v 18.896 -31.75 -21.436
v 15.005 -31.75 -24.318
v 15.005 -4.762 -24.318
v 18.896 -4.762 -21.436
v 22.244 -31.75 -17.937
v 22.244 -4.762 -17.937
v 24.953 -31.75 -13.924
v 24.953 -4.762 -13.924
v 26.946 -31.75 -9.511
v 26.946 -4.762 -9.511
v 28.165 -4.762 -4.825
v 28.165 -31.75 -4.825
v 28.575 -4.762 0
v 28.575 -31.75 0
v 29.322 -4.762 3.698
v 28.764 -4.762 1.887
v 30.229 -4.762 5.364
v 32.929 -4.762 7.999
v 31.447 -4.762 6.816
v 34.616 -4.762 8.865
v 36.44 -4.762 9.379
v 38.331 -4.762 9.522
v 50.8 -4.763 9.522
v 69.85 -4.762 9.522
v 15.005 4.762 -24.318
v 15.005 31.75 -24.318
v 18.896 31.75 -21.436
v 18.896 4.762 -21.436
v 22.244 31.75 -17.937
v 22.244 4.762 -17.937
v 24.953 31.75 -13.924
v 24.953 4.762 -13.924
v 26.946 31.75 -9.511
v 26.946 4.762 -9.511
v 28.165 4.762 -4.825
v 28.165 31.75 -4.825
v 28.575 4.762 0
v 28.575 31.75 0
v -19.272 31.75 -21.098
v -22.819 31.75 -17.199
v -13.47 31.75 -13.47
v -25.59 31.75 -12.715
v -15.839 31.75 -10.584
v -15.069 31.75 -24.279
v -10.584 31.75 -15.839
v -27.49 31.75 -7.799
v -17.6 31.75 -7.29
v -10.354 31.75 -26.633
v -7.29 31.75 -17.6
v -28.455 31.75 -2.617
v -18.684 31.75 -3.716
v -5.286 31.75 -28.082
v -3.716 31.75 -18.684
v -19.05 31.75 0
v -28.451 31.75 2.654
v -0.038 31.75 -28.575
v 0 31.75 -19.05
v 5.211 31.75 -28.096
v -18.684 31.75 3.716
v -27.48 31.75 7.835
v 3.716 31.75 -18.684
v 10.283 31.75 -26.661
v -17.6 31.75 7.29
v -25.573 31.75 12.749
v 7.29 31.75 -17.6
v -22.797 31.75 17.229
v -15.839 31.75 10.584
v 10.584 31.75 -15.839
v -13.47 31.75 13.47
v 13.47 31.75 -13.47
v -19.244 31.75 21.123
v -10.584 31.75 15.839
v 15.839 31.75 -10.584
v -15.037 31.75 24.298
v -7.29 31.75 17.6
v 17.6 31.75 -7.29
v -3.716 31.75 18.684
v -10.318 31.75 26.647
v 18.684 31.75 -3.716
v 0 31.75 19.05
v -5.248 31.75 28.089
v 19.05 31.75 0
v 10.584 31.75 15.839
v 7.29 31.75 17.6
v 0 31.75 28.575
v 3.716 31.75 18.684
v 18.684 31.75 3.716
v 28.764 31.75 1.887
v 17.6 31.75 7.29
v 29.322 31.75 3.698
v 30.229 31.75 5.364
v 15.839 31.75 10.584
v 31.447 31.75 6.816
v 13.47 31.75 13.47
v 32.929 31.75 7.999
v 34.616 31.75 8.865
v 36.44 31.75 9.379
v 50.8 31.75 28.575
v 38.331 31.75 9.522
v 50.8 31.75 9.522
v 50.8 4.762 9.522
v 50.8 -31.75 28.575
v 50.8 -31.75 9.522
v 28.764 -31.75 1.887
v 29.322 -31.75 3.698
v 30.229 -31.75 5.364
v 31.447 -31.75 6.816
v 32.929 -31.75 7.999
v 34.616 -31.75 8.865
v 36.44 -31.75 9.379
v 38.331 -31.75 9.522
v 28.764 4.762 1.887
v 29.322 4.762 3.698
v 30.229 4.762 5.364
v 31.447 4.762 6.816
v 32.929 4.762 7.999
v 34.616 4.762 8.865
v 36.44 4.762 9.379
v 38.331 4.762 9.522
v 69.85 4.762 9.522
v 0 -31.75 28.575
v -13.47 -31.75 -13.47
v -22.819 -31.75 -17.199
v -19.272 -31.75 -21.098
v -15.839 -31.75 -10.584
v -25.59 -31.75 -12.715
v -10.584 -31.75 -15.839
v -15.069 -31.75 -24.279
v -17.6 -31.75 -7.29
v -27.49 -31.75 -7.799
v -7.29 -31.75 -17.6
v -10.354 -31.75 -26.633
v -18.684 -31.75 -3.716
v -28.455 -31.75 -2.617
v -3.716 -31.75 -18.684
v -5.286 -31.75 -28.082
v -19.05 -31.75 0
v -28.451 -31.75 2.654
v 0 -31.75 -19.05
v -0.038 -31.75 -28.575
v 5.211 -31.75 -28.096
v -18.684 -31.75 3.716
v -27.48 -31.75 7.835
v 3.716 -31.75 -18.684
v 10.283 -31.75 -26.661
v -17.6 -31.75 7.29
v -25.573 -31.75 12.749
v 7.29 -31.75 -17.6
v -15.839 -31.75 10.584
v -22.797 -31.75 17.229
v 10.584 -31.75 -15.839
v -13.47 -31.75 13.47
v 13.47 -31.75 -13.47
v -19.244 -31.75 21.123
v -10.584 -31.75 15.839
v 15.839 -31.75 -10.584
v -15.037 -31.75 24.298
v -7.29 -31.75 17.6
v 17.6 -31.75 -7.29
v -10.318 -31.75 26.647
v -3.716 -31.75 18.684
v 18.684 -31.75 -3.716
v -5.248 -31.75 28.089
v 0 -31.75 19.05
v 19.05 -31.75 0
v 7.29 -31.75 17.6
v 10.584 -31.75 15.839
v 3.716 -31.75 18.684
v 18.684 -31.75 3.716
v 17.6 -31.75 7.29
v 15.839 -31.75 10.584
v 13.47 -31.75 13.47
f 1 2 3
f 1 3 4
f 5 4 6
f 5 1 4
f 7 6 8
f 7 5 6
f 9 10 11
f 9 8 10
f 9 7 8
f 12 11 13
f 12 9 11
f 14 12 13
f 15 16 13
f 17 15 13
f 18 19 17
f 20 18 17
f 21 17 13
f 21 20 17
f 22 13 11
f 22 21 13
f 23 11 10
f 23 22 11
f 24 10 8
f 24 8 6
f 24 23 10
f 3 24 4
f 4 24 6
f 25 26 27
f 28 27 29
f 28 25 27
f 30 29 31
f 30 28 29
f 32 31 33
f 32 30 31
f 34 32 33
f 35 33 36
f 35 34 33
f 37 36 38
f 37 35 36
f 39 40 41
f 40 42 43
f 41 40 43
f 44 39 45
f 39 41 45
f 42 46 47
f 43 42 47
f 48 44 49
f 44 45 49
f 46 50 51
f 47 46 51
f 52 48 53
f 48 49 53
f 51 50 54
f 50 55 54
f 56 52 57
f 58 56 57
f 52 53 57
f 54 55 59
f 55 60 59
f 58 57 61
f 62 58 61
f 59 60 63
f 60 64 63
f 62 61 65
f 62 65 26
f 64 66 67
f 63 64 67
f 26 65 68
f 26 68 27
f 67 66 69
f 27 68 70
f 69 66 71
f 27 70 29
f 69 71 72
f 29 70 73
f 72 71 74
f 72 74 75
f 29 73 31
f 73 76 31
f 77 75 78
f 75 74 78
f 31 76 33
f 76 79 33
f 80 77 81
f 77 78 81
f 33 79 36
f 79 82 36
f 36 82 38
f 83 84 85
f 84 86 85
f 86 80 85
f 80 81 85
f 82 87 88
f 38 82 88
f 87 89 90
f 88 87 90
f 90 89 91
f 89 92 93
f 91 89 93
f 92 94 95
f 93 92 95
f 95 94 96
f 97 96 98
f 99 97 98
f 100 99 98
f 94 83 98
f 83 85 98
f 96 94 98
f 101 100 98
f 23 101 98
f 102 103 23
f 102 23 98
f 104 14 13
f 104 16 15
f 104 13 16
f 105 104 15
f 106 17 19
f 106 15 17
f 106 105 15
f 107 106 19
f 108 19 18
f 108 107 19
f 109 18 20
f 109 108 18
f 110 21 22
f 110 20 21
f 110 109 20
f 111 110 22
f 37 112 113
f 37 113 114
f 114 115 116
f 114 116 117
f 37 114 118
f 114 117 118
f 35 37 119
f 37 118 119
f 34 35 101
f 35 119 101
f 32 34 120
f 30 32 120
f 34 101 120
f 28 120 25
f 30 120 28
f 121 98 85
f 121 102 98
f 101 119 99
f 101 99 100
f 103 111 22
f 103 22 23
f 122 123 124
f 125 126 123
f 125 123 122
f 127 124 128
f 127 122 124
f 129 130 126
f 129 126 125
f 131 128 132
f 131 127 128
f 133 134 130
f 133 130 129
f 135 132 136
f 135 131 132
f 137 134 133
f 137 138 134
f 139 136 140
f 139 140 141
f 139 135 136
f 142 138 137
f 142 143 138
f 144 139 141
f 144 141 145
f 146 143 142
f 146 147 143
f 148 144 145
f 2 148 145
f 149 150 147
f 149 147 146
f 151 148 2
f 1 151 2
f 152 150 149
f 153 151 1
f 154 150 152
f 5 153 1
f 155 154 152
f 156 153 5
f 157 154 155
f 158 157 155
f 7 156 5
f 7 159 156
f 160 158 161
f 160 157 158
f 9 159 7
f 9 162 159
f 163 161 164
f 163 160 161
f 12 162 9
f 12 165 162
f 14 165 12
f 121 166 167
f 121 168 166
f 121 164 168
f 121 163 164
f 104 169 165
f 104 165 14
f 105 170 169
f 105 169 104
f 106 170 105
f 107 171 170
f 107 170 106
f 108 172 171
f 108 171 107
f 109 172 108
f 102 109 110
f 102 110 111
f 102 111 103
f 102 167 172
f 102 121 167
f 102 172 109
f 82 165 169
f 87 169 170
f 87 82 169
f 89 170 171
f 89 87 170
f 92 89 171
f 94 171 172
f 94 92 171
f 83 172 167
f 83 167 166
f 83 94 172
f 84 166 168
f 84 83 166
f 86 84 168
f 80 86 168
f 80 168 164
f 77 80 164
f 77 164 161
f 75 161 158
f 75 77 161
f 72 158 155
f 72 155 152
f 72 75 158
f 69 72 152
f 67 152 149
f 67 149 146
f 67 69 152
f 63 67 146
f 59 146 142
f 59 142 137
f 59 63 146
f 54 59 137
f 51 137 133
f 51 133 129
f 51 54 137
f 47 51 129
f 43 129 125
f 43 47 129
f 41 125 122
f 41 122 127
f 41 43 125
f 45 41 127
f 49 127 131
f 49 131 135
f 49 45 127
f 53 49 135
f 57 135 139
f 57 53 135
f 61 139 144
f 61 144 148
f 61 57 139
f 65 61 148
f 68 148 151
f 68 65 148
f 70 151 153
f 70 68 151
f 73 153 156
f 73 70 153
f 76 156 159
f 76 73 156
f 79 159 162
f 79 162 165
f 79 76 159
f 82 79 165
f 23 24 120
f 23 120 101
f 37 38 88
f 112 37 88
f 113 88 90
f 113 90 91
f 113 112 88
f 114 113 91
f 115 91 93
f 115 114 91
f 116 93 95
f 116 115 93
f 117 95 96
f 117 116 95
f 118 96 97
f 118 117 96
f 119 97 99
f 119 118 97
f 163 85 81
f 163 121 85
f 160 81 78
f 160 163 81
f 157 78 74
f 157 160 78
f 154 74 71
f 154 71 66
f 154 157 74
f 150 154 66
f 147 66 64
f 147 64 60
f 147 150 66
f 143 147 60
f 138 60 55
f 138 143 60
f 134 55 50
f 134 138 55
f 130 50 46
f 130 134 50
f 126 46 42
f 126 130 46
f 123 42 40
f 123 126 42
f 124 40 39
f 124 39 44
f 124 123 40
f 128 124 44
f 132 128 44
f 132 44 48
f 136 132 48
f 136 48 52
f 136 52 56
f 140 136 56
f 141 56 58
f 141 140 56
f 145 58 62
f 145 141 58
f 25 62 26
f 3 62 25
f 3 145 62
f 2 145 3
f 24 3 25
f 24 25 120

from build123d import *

# Parameters (mm, degrees)
F0_R     = 19.05
F1_DEPTH = 31.75
F2_DEPTH = 4.7625


with BuildPart() as f1:
    # F0 (on Front) → F1 (new body, symmetric)
    with BuildSketch(Plane.XZ):
        with BuildLine():
            ThreePointArc((15.004938, -24.318356), (24.952923, -13.924161), (28.575, 0))
            ThreePointArc((28.575, 0), (31.446927, 6.816322), (38.330852, 9.522202))
            Line((38.330852, 9.522202), (50.8, 9.522202))
            Line((50.8, 9.522202), (50.8, 28.575))
            Line((50.8, 28.575), (0, 28.575))
            ThreePointArc((0, 28.575), (-27.49025, -7.798512), (15.004938, -24.318356))
        make_face()
        Circle(F0_R, mode=Mode.SUBTRACT)
    extrude(amount=F1_DEPTH, both=True)

    # F0 (on Front) → F2 (join, symmetric)
    with BuildSketch(Plane.XZ):
        with BuildLine():
            ThreePointArc((38.330852, 9.522202), (31.446927, 6.816322), (28.575, 0))
            ThreePointArc((28.575, 0), (24.952923, -13.924161), (15.004938, -24.318356))
            Line((15.004938, -24.318356), (69.85, 9.522202))
            Line((69.85, 9.522202), (50.8, 9.522202))
            Line((50.8, 9.522202), (38.330852, 9.522202))
        make_face()
    extrude(amount=F2_DEPTH, both=True)


solid = f1.part
